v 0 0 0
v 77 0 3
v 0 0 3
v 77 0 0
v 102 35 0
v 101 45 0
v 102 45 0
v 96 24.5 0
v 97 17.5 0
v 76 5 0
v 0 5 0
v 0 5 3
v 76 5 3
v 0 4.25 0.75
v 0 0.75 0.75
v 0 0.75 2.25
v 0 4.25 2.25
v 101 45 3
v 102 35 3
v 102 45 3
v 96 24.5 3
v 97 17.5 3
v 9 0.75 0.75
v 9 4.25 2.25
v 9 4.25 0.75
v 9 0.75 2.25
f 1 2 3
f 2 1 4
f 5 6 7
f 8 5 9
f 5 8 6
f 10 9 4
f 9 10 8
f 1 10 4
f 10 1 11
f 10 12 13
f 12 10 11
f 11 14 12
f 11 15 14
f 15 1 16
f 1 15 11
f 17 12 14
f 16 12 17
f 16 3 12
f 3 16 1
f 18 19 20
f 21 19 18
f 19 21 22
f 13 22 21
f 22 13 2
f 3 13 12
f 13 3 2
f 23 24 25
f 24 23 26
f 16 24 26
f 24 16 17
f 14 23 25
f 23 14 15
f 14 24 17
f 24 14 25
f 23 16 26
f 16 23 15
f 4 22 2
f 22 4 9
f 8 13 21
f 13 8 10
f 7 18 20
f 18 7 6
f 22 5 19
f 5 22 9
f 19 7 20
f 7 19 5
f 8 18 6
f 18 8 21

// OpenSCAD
/*
difference(){
translate([-7,0,0])cube([30,10,8],center=true);
cube([12.7*1.05,5*1.05,10],center=true);
translate([-28,0,0])cube([35,15,5],center=true);
}*/
//76+53
//cube([76,5,3],center=true);
//translate([70/2,-5/2,-3/2])rotate([0,0,-30])cube([53,5,3]);


module line(start, end, thickness1 = 1, thickness2 = 1) {
    hull() {
        translate(start) cube([1,thickness1,3]);
        translate(end) cube([1,thickness2,3]);
    }
}

difference(){
line([0,0,0], [76,0,0],5,5);
translate([-1,0.75,1.5/2])cube([10,3.5,1.5]);
}
//line([76,0,0], [76+40,35,0],5);
line([76,0,0], [76+40-20,35-17.5,0],5,7);
line([76+40-20,35-17.5,0], [76+40-10-5,35,0],7,10);
